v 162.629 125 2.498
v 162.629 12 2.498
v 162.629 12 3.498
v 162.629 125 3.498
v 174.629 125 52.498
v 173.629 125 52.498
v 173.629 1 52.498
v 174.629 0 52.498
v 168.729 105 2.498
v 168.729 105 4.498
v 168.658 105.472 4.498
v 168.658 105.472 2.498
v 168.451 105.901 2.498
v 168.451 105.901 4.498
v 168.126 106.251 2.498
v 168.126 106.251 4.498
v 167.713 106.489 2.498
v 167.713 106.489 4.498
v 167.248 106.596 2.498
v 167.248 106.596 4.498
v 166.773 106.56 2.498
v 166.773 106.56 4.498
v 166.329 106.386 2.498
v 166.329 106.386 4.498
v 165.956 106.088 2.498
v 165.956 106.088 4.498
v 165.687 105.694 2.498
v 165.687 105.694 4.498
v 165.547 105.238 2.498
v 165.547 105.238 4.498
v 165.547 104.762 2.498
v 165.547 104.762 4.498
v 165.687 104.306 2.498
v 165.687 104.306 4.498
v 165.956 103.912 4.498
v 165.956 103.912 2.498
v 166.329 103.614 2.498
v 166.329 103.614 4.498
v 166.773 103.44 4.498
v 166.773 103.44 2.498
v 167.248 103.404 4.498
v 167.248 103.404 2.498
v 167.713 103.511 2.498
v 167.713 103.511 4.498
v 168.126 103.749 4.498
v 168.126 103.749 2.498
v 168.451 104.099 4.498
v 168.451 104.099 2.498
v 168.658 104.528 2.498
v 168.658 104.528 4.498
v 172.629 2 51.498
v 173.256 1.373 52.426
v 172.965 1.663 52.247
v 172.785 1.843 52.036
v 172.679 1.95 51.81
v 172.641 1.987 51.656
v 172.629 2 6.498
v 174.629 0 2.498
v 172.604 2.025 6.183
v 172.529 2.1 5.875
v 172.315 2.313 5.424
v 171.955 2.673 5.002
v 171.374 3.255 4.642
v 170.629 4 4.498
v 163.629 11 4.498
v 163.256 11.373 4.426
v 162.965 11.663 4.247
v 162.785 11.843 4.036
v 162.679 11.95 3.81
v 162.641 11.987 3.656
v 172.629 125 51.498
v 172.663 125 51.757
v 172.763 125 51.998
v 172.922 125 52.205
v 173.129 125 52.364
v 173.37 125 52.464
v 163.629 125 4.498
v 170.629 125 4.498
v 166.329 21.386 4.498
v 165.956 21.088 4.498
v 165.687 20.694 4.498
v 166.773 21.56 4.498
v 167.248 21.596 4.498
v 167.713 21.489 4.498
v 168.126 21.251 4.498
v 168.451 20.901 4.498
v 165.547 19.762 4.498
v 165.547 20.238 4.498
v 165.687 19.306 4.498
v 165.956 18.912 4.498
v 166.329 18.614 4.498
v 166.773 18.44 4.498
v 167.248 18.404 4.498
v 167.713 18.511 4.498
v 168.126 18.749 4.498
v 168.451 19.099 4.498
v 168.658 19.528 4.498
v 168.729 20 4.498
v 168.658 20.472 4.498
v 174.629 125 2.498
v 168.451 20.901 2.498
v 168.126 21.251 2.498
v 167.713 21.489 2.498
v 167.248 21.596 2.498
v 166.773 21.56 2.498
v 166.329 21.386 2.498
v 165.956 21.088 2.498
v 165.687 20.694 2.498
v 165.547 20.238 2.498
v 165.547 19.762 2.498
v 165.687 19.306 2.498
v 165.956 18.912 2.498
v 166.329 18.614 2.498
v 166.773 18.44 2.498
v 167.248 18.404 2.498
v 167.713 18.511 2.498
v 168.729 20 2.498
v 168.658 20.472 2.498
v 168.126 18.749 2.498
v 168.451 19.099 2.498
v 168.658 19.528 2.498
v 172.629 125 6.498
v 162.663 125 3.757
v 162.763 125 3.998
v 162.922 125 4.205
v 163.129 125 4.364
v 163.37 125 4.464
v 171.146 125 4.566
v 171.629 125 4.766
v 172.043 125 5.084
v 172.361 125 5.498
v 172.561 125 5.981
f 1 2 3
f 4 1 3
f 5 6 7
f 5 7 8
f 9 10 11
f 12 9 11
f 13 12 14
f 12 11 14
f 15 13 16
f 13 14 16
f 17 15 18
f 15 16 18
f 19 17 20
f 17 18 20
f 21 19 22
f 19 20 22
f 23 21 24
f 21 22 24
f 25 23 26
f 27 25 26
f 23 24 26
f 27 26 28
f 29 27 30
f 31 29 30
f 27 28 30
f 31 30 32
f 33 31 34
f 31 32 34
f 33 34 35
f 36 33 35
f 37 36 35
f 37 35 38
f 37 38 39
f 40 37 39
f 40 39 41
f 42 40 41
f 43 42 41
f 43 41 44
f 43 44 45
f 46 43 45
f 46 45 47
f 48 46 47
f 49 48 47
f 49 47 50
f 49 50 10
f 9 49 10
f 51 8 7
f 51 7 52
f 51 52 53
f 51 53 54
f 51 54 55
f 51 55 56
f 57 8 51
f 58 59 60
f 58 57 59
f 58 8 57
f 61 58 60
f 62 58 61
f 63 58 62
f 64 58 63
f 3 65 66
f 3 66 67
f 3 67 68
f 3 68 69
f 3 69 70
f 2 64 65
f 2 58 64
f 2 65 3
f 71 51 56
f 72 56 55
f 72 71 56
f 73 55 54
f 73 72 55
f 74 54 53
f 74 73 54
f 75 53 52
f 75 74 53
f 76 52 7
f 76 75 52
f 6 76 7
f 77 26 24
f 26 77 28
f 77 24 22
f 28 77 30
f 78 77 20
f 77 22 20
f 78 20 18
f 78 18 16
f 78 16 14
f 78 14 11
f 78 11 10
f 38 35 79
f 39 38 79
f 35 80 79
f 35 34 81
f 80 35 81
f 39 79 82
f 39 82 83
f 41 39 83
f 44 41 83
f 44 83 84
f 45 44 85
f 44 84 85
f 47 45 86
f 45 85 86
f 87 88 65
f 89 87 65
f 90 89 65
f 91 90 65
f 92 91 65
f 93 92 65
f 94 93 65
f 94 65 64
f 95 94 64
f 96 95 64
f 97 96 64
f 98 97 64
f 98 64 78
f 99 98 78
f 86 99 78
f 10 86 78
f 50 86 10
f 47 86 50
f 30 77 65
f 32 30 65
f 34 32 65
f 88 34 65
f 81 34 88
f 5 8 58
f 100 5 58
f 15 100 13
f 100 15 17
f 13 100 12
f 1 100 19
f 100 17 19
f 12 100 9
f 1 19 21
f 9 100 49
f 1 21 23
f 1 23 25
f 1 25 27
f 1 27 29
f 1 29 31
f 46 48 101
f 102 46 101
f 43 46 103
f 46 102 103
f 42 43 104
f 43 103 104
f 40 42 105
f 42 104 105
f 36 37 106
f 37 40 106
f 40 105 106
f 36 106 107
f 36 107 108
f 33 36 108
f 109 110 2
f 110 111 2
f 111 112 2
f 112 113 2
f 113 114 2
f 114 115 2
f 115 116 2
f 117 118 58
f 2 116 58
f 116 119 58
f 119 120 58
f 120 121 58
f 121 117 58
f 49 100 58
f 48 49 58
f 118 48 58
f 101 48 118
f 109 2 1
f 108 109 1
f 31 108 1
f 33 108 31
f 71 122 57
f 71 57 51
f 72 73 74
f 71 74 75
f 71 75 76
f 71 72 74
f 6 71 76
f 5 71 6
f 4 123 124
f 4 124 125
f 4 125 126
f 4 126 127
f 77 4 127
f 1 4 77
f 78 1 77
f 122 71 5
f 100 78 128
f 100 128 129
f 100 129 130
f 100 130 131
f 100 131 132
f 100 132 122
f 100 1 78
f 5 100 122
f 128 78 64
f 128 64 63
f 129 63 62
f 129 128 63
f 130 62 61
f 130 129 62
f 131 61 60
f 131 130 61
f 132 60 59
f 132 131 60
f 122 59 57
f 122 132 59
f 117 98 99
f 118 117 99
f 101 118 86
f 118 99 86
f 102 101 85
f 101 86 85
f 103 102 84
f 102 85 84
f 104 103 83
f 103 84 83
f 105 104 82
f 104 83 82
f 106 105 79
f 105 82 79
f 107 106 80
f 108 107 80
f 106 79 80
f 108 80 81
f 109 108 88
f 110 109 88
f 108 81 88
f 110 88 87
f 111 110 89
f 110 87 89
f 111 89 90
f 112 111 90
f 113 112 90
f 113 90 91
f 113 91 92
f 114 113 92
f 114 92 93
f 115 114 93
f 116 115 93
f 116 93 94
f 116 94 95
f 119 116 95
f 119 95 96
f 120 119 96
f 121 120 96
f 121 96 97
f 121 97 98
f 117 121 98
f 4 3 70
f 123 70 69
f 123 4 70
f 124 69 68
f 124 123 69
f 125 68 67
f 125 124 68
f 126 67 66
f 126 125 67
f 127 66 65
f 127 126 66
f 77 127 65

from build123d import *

# Parameters (mm, degrees)
BOSS_EXTRUDE1_DEPTH     = 125
FILLET1_R               = 1
FILLET2_R               = 2
SKETCH3_R               = 1.6
CUT_EXTRUDE1_DEPTH      = 221.054985344
CUT_EXTRUDE2_DEPTH      = 221.054985344
CUT_EXTRUDE2_DEPTH_BACK = 221.054985344


with BuildPart() as part:
    # Sketch2 → Boss-Extrude1 (new body)
    with BuildSketch(Plane(origin=(0, 0, 0), x_dir=(1, 0, 0), z_dir=(0, 1, 0))):
        Polygon((174.628739257, -52.498316328), (174.628739257, -2.498316328), (162.628739257, -2.498316328), (162.628739257, -4.498316328), (172.628739257, -4.498316328), (172.628739257, -52.498316328), align=None)
    extrude(amount=BOSS_EXTRUDE1_DEPTH)

    # Fillet1
    fillet1_edges = [part.edges().sort_by_distance(p)[0] for p in [
        (172.628739257, 62.5, 52.498316328),
        (162.628739257, 62.5, 4.498316328),
    ]]
    fillet(fillet1_edges, radius=FILLET1_R)

    # Fillet2
    fillet2_edges = [part.edges().sort_by_distance(p)[0] for p in [
        (172.628739257, 62.5, 4.498316328),
    ]]
    fillet(fillet2_edges, radius=FILLET2_R)

    # Sketch3 → Cut-Extrude1 (cut, through all)
    with BuildSketch(Plane.XY.offset(4.498316328)):
        with Locations((167.128739257, 20)):
            Circle(SKETCH3_R)
        with Locations((167.128739257, 105)):
            Circle(SKETCH3_R)
    extrude(amount=-CUT_EXTRUDE1_DEPTH, mode=Mode.SUBTRACT)

    # Sketch4 → Cut-Extrude2 (cut, two sides: drawn at the far end of the back side and taken through both)
    with BuildSketch(Plane.XY.offset(4.498316328).offset(-CUT_EXTRUDE2_DEPTH_BACK)):
        Polygon((174.628739257, 0), (162.628739257, 12), (162.628739257, 0), align=None)
    extrude(amount=CUT_EXTRUDE2_DEPTH + CUT_EXTRUDE2_DEPTH_BACK, mode=Mode.SUBTRACT)


solid = part.part
